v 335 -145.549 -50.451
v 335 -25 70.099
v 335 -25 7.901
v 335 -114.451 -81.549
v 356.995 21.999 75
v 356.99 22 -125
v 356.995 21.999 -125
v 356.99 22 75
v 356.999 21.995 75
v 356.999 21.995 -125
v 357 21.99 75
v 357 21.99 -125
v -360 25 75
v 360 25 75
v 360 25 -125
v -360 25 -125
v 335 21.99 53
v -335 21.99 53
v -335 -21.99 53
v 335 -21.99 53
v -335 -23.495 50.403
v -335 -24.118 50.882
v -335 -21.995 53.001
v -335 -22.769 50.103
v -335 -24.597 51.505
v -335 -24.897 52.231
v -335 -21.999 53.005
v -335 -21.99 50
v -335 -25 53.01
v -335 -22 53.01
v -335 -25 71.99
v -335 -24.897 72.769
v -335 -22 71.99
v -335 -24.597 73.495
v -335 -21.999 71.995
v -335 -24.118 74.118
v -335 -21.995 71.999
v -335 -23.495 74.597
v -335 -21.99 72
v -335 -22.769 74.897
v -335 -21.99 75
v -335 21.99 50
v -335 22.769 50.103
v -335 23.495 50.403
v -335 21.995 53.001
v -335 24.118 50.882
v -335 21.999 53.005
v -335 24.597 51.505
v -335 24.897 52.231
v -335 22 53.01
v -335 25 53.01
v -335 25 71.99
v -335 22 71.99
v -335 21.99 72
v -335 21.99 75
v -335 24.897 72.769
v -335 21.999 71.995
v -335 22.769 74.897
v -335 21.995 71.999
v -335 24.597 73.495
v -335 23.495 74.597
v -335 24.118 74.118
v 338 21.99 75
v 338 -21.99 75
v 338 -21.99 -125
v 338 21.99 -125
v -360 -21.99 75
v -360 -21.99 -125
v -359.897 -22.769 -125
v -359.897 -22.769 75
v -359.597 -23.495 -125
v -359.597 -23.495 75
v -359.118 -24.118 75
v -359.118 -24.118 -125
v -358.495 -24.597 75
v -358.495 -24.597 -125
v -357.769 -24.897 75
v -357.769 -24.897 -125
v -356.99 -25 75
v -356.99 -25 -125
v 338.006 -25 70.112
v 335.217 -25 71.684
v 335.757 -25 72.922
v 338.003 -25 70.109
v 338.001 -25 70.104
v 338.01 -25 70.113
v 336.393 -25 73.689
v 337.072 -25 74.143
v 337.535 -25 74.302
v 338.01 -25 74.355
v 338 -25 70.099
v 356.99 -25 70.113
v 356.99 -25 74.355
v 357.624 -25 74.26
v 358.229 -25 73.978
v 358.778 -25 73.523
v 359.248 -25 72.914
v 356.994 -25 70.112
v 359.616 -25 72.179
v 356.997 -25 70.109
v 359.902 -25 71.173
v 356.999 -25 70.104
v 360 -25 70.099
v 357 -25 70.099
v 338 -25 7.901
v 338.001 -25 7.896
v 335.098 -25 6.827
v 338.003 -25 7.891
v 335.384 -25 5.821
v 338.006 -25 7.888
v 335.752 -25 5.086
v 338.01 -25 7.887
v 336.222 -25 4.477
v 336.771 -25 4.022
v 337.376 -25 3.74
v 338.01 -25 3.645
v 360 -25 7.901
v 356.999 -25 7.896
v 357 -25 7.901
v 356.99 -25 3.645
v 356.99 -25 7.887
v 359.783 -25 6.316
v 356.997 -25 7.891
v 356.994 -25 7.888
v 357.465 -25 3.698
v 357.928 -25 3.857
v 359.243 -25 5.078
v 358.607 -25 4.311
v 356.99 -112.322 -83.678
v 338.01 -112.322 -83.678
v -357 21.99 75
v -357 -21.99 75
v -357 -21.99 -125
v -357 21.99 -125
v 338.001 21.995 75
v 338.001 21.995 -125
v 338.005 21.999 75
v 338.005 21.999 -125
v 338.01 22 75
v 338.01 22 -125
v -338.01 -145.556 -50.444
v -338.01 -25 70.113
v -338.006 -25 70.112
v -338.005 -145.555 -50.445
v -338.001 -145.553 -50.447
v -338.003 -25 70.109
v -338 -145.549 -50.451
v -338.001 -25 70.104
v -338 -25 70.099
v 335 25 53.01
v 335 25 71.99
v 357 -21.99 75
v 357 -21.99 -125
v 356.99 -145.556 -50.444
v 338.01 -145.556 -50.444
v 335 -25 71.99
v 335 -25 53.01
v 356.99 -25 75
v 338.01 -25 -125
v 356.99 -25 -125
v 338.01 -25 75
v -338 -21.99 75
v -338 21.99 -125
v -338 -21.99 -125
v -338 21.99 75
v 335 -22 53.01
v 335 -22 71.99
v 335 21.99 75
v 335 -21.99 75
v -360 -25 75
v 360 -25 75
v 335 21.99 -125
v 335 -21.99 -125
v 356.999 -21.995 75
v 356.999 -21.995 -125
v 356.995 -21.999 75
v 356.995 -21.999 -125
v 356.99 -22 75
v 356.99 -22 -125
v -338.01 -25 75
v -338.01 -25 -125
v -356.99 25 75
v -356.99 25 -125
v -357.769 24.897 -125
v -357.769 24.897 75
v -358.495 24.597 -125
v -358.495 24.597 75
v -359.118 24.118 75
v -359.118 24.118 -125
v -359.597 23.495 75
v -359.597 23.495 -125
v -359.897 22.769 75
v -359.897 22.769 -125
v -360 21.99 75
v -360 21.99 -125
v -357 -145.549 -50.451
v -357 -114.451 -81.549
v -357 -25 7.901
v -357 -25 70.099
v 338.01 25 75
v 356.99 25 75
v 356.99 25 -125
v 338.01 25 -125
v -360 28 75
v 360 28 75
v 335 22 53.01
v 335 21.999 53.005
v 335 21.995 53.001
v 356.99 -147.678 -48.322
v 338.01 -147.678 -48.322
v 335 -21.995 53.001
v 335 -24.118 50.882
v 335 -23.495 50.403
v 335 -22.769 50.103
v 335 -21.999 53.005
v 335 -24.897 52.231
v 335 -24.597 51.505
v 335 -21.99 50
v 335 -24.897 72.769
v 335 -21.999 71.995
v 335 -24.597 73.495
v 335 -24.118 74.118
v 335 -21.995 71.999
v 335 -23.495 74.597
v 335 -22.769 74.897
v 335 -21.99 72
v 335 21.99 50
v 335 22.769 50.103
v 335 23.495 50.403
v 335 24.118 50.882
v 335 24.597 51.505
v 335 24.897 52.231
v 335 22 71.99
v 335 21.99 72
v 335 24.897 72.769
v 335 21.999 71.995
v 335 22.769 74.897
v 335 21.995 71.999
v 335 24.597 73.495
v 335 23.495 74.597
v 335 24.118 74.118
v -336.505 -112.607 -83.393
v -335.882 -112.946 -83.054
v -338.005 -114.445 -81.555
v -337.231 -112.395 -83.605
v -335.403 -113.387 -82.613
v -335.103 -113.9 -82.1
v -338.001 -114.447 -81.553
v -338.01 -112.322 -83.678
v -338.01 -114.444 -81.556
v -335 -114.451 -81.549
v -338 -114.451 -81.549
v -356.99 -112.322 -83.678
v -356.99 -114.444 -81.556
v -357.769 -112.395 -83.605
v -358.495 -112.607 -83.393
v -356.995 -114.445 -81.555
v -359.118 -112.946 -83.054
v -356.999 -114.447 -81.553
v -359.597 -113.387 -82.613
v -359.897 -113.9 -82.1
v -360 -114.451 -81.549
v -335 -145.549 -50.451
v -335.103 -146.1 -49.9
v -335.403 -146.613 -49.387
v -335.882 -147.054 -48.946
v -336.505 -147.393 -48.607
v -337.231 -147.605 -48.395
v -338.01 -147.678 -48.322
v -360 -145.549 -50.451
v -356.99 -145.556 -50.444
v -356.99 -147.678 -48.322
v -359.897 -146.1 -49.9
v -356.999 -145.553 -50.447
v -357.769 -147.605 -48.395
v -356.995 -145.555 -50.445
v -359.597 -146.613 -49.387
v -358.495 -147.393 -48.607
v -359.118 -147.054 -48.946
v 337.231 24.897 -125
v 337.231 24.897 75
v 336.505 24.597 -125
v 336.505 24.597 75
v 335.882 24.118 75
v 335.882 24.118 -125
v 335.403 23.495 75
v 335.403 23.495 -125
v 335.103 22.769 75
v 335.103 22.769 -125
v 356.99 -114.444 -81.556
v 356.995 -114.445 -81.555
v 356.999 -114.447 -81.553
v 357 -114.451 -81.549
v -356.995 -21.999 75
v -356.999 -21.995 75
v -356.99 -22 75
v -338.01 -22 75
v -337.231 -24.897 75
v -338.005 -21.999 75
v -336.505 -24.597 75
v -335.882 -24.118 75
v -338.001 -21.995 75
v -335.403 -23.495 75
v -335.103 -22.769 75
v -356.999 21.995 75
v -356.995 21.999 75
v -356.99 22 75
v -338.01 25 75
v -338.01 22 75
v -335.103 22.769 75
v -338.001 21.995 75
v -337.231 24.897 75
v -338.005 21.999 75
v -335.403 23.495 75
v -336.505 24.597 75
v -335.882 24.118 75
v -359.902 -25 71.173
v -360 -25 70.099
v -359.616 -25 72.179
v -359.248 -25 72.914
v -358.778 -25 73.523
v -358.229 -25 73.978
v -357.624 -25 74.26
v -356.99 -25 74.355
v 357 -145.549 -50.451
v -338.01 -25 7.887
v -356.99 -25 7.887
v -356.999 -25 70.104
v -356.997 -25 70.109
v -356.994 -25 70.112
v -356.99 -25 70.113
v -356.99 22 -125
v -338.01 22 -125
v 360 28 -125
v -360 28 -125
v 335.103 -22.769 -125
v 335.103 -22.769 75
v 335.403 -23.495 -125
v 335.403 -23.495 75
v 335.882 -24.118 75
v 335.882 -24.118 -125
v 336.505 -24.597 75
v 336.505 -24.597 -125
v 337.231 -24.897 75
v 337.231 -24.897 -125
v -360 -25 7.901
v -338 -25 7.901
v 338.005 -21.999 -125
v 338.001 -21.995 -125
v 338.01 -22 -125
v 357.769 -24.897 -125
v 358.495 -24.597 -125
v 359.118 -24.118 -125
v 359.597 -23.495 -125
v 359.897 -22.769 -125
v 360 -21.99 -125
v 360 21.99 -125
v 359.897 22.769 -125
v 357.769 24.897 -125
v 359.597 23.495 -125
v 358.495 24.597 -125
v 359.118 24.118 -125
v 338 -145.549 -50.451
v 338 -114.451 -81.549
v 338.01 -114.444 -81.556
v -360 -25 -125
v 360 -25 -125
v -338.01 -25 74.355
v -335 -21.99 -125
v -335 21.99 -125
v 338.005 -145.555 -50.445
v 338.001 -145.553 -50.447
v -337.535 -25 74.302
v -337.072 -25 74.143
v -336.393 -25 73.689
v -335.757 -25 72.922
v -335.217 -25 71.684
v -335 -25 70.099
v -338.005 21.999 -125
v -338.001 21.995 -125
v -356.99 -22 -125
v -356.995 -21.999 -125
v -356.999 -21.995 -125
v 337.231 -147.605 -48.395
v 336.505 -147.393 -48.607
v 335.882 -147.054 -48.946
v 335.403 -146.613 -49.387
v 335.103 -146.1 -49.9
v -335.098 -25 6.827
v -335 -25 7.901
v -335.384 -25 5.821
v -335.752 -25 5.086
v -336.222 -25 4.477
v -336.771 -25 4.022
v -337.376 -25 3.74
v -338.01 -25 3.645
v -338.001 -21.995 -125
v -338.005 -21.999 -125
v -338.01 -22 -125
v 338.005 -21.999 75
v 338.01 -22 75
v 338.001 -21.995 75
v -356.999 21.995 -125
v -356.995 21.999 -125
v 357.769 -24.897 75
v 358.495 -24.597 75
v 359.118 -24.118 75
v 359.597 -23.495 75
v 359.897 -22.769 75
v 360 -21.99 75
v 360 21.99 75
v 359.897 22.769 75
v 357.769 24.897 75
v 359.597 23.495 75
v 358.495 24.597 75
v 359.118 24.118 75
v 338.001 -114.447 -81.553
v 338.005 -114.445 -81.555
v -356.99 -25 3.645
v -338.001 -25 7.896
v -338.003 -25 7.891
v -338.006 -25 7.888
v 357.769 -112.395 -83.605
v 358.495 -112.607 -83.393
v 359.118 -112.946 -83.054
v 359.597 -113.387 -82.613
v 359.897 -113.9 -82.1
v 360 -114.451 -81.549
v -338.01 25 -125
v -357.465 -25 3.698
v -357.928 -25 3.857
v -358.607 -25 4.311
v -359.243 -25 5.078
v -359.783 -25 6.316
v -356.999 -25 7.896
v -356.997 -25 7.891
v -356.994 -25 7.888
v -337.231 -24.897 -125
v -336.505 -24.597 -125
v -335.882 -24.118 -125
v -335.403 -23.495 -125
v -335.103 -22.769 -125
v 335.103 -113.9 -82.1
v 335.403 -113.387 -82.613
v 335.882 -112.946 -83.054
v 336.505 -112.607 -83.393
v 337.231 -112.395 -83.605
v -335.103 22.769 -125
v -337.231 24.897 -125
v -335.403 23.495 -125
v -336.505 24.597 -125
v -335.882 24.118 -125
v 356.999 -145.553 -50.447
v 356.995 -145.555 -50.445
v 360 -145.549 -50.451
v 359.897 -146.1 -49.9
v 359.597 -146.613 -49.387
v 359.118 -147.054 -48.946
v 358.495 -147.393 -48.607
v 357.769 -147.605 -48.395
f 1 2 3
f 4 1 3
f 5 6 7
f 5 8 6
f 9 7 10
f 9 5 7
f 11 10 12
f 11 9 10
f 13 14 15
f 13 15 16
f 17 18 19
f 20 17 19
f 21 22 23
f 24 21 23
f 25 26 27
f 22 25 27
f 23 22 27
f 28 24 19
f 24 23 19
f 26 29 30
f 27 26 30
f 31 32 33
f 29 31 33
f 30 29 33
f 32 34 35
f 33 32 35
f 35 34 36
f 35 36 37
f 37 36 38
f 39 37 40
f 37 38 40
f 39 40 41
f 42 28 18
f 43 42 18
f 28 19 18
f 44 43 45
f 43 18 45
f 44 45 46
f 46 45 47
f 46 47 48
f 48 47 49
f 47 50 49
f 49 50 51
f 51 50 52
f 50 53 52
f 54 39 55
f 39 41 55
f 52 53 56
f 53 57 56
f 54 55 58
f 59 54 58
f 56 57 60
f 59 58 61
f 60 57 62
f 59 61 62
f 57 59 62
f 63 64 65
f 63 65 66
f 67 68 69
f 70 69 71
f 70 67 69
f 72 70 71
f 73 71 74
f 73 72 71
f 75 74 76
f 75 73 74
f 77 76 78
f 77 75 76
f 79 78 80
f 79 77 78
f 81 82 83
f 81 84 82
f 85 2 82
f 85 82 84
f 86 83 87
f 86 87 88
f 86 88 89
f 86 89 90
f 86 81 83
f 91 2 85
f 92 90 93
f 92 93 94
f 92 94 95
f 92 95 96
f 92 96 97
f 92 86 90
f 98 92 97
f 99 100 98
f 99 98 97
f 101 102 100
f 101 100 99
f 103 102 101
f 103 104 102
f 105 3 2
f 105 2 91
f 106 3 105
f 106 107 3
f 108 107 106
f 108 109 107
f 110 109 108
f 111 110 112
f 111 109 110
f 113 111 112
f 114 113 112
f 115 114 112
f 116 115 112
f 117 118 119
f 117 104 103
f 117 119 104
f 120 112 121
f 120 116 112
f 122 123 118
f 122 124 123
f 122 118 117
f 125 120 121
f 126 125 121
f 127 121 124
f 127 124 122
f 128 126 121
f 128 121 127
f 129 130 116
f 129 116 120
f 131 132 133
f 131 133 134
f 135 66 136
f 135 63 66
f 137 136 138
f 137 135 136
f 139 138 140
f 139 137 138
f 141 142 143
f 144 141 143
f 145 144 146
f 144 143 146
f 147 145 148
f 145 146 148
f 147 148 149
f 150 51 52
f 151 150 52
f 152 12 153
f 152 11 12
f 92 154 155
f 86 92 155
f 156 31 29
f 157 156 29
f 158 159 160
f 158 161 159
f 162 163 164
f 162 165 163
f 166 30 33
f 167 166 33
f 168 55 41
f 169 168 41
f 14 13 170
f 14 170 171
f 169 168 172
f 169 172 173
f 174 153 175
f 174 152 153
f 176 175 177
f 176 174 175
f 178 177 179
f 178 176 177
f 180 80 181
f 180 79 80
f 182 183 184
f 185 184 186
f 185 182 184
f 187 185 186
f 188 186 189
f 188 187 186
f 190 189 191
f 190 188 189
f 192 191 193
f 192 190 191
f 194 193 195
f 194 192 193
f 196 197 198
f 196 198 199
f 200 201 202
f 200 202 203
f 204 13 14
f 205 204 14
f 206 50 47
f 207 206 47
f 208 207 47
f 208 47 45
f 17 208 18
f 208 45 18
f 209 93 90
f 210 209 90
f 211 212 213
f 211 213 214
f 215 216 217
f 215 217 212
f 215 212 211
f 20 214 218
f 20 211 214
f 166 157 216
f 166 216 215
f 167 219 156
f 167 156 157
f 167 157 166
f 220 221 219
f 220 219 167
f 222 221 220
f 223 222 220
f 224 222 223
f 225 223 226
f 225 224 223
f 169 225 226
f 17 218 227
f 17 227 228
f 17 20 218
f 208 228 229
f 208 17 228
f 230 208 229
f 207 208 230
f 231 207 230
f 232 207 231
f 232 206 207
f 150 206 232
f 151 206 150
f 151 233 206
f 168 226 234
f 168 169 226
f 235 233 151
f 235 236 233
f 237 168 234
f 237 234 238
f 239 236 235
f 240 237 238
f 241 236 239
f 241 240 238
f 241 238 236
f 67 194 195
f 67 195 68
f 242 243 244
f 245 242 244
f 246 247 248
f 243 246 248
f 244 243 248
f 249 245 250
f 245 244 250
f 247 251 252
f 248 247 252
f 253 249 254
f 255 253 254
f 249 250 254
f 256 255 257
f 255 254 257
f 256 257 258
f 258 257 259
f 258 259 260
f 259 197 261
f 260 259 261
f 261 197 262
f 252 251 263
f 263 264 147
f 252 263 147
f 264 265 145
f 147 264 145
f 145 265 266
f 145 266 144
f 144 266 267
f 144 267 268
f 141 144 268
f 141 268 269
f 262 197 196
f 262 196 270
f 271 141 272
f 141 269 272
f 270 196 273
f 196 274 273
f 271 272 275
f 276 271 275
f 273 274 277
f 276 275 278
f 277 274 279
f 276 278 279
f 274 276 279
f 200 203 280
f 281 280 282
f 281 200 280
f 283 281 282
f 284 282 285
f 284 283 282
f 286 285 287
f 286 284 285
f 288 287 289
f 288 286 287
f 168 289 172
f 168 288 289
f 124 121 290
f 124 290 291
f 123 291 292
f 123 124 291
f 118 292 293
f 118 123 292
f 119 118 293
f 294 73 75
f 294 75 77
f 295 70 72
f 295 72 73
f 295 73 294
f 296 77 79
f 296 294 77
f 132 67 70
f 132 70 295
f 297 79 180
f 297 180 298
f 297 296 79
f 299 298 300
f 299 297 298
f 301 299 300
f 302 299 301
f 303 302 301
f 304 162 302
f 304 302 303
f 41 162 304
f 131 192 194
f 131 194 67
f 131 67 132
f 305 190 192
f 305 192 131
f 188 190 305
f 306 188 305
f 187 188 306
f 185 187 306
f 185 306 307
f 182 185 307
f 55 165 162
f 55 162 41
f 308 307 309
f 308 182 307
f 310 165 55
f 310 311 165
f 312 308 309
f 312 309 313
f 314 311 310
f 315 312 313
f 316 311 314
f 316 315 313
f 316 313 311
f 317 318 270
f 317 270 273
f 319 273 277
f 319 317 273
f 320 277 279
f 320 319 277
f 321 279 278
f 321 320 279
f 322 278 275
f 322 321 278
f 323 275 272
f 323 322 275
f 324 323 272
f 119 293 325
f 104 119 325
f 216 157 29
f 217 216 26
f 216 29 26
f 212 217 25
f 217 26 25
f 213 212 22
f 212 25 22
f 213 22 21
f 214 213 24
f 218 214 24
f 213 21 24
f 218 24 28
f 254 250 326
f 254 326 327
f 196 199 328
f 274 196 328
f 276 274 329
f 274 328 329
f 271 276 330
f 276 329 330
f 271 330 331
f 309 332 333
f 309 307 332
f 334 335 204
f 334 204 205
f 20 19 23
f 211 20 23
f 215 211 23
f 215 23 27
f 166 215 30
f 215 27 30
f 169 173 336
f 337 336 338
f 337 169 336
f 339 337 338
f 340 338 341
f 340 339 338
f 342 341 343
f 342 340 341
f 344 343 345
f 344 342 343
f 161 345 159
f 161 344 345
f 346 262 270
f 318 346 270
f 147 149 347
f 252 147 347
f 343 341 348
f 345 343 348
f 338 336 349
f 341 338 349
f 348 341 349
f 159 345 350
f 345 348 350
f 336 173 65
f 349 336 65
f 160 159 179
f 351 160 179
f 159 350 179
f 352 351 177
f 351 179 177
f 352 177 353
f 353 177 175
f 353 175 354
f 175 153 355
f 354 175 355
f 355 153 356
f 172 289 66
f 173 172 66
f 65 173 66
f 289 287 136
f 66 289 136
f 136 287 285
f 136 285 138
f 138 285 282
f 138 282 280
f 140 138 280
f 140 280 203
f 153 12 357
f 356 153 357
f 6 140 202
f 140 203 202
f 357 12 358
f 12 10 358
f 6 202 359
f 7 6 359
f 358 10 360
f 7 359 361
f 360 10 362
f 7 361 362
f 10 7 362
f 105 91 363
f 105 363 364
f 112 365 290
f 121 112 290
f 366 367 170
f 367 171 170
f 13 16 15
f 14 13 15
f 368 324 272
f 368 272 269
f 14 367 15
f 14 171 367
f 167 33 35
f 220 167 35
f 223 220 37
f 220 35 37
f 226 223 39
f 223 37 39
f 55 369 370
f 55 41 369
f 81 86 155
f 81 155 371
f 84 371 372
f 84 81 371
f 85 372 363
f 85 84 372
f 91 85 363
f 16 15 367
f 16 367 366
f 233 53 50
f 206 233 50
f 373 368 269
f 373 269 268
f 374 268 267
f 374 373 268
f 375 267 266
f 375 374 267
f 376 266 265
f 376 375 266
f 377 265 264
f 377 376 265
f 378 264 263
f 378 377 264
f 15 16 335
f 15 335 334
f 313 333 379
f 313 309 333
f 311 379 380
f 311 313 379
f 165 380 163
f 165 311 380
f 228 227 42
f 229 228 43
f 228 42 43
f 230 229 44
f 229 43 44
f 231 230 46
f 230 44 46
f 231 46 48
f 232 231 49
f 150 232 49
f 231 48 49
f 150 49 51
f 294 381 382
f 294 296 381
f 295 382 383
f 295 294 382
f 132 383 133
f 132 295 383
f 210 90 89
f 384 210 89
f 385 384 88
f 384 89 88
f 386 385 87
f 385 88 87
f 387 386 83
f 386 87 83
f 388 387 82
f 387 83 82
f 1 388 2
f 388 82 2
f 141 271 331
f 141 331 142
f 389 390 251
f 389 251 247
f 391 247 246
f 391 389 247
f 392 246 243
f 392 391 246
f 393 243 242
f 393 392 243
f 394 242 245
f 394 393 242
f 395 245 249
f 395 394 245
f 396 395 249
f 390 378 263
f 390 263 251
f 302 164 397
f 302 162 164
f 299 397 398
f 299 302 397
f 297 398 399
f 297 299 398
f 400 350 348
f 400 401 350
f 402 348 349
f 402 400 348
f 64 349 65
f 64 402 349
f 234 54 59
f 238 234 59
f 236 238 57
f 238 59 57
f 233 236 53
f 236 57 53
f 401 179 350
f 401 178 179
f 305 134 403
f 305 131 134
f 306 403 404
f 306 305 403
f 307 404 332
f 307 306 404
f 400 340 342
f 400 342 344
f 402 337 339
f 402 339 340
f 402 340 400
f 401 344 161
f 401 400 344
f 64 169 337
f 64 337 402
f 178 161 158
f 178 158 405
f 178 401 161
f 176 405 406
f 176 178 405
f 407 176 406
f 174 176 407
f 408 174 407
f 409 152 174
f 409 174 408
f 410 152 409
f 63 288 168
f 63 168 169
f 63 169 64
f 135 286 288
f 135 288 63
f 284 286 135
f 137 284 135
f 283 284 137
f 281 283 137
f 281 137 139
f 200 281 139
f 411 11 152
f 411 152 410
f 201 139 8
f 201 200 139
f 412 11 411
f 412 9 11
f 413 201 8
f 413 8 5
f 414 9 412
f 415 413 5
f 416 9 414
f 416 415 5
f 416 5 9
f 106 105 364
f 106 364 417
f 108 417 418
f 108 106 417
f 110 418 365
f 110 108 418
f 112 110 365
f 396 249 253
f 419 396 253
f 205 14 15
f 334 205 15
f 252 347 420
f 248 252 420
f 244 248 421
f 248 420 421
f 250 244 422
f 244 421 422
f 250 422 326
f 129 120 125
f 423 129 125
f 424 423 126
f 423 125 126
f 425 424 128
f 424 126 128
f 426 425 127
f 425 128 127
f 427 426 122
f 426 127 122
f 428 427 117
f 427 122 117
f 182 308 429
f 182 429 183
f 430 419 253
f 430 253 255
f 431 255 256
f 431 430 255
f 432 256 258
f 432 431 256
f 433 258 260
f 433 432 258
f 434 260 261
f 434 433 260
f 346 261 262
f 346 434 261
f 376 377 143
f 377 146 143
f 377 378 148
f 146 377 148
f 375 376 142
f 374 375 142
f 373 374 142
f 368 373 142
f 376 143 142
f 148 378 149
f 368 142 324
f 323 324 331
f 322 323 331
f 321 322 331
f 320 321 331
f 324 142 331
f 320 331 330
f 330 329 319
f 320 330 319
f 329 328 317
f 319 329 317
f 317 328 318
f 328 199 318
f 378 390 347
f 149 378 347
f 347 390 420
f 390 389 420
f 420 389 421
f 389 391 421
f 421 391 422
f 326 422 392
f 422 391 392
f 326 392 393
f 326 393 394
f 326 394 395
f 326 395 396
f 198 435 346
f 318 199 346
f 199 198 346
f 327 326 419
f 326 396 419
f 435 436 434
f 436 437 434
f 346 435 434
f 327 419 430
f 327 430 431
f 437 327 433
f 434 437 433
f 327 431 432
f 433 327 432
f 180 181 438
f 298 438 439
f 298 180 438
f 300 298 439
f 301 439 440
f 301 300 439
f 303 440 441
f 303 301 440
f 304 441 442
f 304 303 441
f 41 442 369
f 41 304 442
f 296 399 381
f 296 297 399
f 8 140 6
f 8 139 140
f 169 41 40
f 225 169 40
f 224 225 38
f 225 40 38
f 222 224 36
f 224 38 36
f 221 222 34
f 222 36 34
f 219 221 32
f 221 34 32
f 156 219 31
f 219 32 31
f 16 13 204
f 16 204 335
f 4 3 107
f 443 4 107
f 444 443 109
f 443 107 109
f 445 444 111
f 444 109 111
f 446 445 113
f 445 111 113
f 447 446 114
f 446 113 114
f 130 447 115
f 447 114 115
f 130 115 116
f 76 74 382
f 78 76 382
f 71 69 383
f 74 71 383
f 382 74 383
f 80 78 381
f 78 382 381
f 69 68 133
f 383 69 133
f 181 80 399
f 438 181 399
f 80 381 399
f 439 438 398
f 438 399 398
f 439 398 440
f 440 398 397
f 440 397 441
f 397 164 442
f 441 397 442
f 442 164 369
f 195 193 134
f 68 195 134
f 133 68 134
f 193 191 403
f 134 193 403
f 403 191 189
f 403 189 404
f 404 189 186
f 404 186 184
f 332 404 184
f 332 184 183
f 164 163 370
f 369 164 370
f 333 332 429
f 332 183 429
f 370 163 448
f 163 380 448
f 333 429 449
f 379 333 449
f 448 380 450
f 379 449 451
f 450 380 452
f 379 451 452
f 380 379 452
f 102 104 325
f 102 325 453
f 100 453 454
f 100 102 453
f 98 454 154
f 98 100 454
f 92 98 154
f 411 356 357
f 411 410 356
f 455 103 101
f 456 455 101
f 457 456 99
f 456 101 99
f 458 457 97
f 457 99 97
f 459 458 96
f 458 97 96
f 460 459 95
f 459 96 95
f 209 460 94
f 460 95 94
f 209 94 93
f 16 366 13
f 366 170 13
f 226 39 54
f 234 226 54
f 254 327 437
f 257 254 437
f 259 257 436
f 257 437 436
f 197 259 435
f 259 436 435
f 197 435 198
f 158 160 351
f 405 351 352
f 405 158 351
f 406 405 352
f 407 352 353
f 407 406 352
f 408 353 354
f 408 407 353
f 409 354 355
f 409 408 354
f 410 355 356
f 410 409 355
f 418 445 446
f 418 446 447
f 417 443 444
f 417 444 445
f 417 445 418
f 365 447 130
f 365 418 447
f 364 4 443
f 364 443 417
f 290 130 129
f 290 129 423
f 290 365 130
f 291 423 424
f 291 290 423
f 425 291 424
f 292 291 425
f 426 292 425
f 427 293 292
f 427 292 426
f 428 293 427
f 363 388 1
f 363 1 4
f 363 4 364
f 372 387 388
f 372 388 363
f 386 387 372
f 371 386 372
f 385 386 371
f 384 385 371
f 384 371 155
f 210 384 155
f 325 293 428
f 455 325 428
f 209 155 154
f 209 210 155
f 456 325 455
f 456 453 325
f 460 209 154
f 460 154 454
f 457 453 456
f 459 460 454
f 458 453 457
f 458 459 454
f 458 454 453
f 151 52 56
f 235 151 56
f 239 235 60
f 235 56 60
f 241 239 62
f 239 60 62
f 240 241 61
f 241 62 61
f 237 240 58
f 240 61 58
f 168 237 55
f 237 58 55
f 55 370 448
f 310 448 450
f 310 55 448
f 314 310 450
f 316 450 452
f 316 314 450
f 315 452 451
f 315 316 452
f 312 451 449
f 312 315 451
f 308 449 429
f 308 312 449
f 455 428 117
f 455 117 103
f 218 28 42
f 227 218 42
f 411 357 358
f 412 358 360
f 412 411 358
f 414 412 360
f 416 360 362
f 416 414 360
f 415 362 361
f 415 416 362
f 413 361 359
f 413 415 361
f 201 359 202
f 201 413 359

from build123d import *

# Parameters (mm, degrees)
SKETCH_1_W              = 720
SKETCH_1_H              = 150
EXTRUDE_1_DEPTH         = 25
SKETCH_2_W              = 720
SKETCH_2_H              = 50
EXTRUDE_2_DEPTH         = 50
F_50_START              = -335
F_50_X_25_X_3_1_DEPTH   = 670
F_50_START_2            = -75
F_50_X_25_X_3_1_2_DEPTH = 150
F_50_X_25_X_3_1_3_DEPTH = 150
BODY_START              = -75
BODY_4_RUN_ON_DEPTH     = 50
BODY_3_RUN_ON_DEPTH     = 50
SKETCH_5_W              = 720
SKETCH_5_H              = 200
EXTRUDE_3_DEPTH         = 3
F_50_X_25_X_3_2_DEPTH   = 183.847763109


# Read off the part's stored shape, not the designer's step: Прямоугольная труба 50 X 25 X 3(1), Отсечь/Удлинить2
with BuildPart() as part:
    # Эскиз1 → Бобышка-Вытянуть1 (new, symmetric)
    with BuildSketch(Plane(origin=(0, 0, 0), x_dir=(1, 0, 0), z_dir=(0, 1, 0))):
        Rectangle(SKETCH_1_W, SKETCH_1_H)
    extrude(amount=EXTRUDE_1_DEPTH, both=True)

    # Эскиз2 → Бобышка-Вытянуть2 (add)
    with BuildSketch(Plane(origin=(0, 0, -75), x_dir=(-1, 0, 0), z_dir=(0, 0, -1))):
        Rectangle(SKETCH_2_W, SKETCH_2_H)
    extrude(amount=EXTRUDE_2_DEPTH)


with BuildPart() as body_2:
    # Прямоугольная труба 50 X 25 X 3(1) outline → Прямоугольная труба 50 X 25 X 3(1) (new body)
    with BuildSketch(Plane.YZ.offset(F_50_START)):
        with BuildLine():
            Line((-21.99, 50), (21.99, 50))
            ThreePointArc((21.99, 50), (24.118391411, 50.881608589), (25, 53.01))
            Line((25, 53.01), (25, 71.99))
            ThreePointArc((25, 71.99), (24.118391411, 74.118391411), (21.99, 75))
            Line((21.99, 75), (-21.99, 75))
            ThreePointArc((-21.99, 75), (-24.118391411, 74.118391411), (-25, 71.99))
            Line((-25, 71.99), (-25, 53.01))
            ThreePointArc((-25, 53.01), (-24.118391411, 50.881608589), (-21.99, 50))
        make_face()
        with BuildLine():
            ThreePointArc((-22, 71.99), (-21.997071068, 71.997071068), (-21.99, 72))
            Line((-21.99, 72), (21.99, 72))
            ThreePointArc((21.99, 72), (21.997071068, 71.997071068), (22, 71.99))
            Line((22, 71.99), (22, 53.01))
            ThreePointArc((22, 53.01), (21.997071068, 53.002928932), (21.99, 53))
            Line((21.99, 53), (-21.99, 53))
            ThreePointArc((-21.99, 53), (-21.997071068, 53.002928932), (-22, 53.01))
            Line((-22, 53.01), (-22, 71.99))
        make_face(mode=Mode.SUBTRACT)
    extrude(amount=F_50_X_25_X_3_1_DEPTH)


with BuildPart() as body_3:
    # 50 X 25 X 3_1 2 outline → 50 X 25 X 3_1 2 (new body)
    with BuildSketch(Plane.XY.offset(F_50_START_2)):
        with BuildLine():
            ThreePointArc((360, 21.99), (359.118391411, 24.118391411), (356.99, 25))
            Line((356.99, 25), (338.01, 25))
            ThreePointArc((338.01, 25), (335.881608589, 24.118391411), (335, 21.99))
            Line((335, 21.99), (335, -21.99))
            ThreePointArc((335, -21.99), (335.881608589, -24.118391411), (338.01, -25))
            Line((338.01, -25), (356.99, -25))
            ThreePointArc((356.99, -25), (359.118391411, -24.118391411), (360, -21.99))
            Line((360, -21.99), (360, 21.99))
        make_face()
        with BuildLine():
            Line((338, -21.99), (338, 21.99))
            ThreePointArc((338, 21.99), (338.002928932, 21.997071068), (338.01, 22))
            Line((338.01, 22), (356.99, 22))
            ThreePointArc((356.99, 22), (356.997071068, 21.997071068), (357, 21.99))
            Line((357, 21.99), (357, -21.99))
            ThreePointArc((357, -21.99), (356.997071068, -21.997071068), (356.99, -22))
            Line((356.99, -22), (338.01, -22))
            ThreePointArc((338.01, -22), (338.002928932, -21.997071068), (338, -21.99))
        make_face(mode=Mode.SUBTRACT)
    extrude(amount=F_50_X_25_X_3_1_2_DEPTH)

    # 50 X 25 X 3_1 2 outline → body 3 run on (add)
    with BuildSketch(Plane.XY.offset(BODY_START)):
        with BuildLine():
            ThreePointArc((360, 21.99), (359.118391411, 24.118391411), (356.99, 25))
            Line((356.99, 25), (338.01, 25))
            ThreePointArc((338.01, 25), (335.881608589, 24.118391411), (335, 21.99))
            Line((335, 21.99), (335, -21.99))
            ThreePointArc((335, -21.99), (335.881608589, -24.118391411), (338.01, -25))
            Line((338.01, -25), (356.99, -25))
            ThreePointArc((356.99, -25), (359.118391411, -24.118391411), (360, -21.99))
            Line((360, -21.99), (360, 21.99))
        make_face()
        with BuildLine():
            Line((338, -21.99), (338, 21.99))
            ThreePointArc((338, 21.99), (338.002928932, 21.997071068), (338.01, 22))
            Line((338.01, 22), (356.99, 22))
            ThreePointArc((356.99, 22), (356.997071068, 21.997071068), (357, 21.99))
            Line((357, 21.99), (357, -21.99))
            ThreePointArc((357, -21.99), (356.997071068, -21.997071068), (356.99, -22))
            Line((356.99, -22), (338.01, -22))
            ThreePointArc((338.01, -22), (338.002928932, -21.997071068), (338, -21.99))
        make_face(mode=Mode.SUBTRACT)
    extrude(amount=-BODY_3_RUN_ON_DEPTH)


with BuildPart() as body_4:
    # 50 X 25 X 3_1 3 outline → 50 X 25 X 3_1 3 (new body)
    with BuildSketch(Plane.XY.offset(F_50_START_2)):
        with BuildLine():
            ThreePointArc((-335, 21.99), (-335.881608589, 24.118391411), (-338.01, 25))
            Line((-338.01, 25), (-356.99, 25))
            ThreePointArc((-356.99, 25), (-359.118391411, 24.118391411), (-360, 21.99))
            Line((-360, 21.99), (-360, -21.99))
            ThreePointArc((-360, -21.99), (-359.118391411, -24.118391411), (-356.99, -25))
            Line((-356.99, -25), (-338.01, -25))
            ThreePointArc((-338.01, -25), (-335.881608589, -24.118391411), (-335, -21.99))
            Line((-335, -21.99), (-335, 21.99))
        make_face()
        with BuildLine():
            Line((-357, -21.99), (-357, 21.99))
            ThreePointArc((-357, 21.99), (-356.997071068, 21.997071068), (-356.99, 22))
            Line((-356.99, 22), (-338.01, 22))
            ThreePointArc((-338.01, 22), (-338.002928932, 21.997071068), (-338, 21.99))
            Line((-338, 21.99), (-338, -21.99))
            ThreePointArc((-338, -21.99), (-338.002928932, -21.997071068), (-338.01, -22))
            Line((-338.01, -22), (-356.99, -22))
            ThreePointArc((-356.99, -22), (-356.997071068, -21.997071068), (-357, -21.99))
        make_face(mode=Mode.SUBTRACT)
    extrude(amount=F_50_X_25_X_3_1_3_DEPTH)

    # 50 X 25 X 3_1 3 outline → body 4 run on (add)
    with BuildSketch(Plane.XY.offset(BODY_START)):
        with BuildLine():
            ThreePointArc((-335, 21.99), (-335.881608589, 24.118391411), (-338.01, 25))
            Line((-338.01, 25), (-356.99, 25))
            ThreePointArc((-356.99, 25), (-359.118391411, 24.118391411), (-360, 21.99))
            Line((-360, 21.99), (-360, -21.99))
            ThreePointArc((-360, -21.99), (-359.118391411, -24.118391411), (-356.99, -25))
            Line((-356.99, -25), (-338.01, -25))
            ThreePointArc((-338.01, -25), (-335.881608589, -24.118391411), (-335, -21.99))
            Line((-335, -21.99), (-335, 21.99))
        make_face()
        with BuildLine():
            Line((-357, -21.99), (-357, 21.99))
            ThreePointArc((-357, 21.99), (-356.997071068, 21.997071068), (-356.99, 22))
            Line((-356.99, 22), (-338.01, 22))
            ThreePointArc((-338.01, 22), (-338.002928932, 21.997071068), (-338, 21.99))
            Line((-338, 21.99), (-338, -21.99))
            ThreePointArc((-338, -21.99), (-338.002928932, -21.997071068), (-338.01, -22))
            Line((-338.01, -22), (-356.99, -22))
            ThreePointArc((-356.99, -22), (-356.997071068, -21.997071068), (-357, -21.99))
        make_face(mode=Mode.SUBTRACT)
    extrude(amount=-BODY_4_RUN_ON_DEPTH)


with BuildPart() as body_5:
    # Эскиз5 → Бобышка-Вытянуть3 (new body)
    with BuildSketch(Plane(origin=(0, 25, 0), x_dir=(1, 0, 0), z_dir=(0, 1, 0))):
        with Locations((0, 25)):
            Rectangle(SKETCH_5_W, SKETCH_5_H)
    extrude(amount=EXTRUDE_3_DEPTH)


with BuildPart() as body_6:
    # Sketch11 → Прямоугольная труба 50 X 25 X 3(2) (new body)
    with BuildSketch(Plane(origin=(347.5, 0, 64), x_dir=(1, 0, 0), z_dir=(0, -0.7071067811865487, -0.7071067811865465))):
        with BuildLine():
            Line((-9.49, -25), (9.49, -25))
            ThreePointArc((9.49, -25), (11.618391411, -24.118391411), (12.5, -21.99))
            Line((12.5, -21.99), (12.5, 21.99))
            ThreePointArc((12.5, 21.99), (11.618391411, 24.118391411), (9.49, 25))
            Line((9.49, 25), (-9.49, 25))
            ThreePointArc((-9.49, 25), (-11.618391411, 24.118391411), (-12.5, 21.99))
            Line((-12.5, 21.99), (-12.5, -21.99))
            ThreePointArc((-12.5, -21.99), (-11.618391411, -24.118391411), (-9.49, -25))
        make_face()
        with BuildLine():
            Line((-9.49, -22), (9.49, -22))
            ThreePointArc((9.49, -22), (9.497071068, -21.997071068), (9.5, -21.99))
            Line((9.5, -21.99), (9.5, 21.99))
            ThreePointArc((9.5, 21.99), (9.497071068, 21.997071068), (9.49, 22))
            Line((9.49, 22), (-9.49, 22))
            ThreePointArc((-9.49, 22), (-9.497071068, 21.997071068), (-9.5, 21.99))
            Line((-9.5, 21.99), (-9.5, -21.99))
            ThreePointArc((-9.5, -21.99), (-9.497071068, -21.997071068), (-9.49, -22))
        make_face(mode=Mode.SUBTRACT)
    extrude(amount=F_50_X_25_X_3_2_DEPTH)


with BuildPart() as body_7:
    # Weld Trim 2: the piece on the far side of the plane
    add(body_6.part)
    split(bisect_by=Plane(origin=(0, -25, 0), x_dir=(1, 0, 0), z_dir=(0, 1, 0)), keep=Keep.BOTTOM)


with BuildPart() as body_6_1:
    add(body_6.part)

    # Weld Trim 2
    split(bisect_by=Plane(origin=(0, -25, 0), x_dir=(1, 0, 0), z_dir=(0, 1, 0)), keep=Keep.TOP)


with BuildPart() as body_7_2:
    # Зеркальное отражение1: mirrored copy
    add(body_7.part.mirror(Plane(origin=(0, 0, 0), x_dir=(0, 0, 1), z_dir=(1, 0, 0))))


solid = Compound([part.part, body_2.part, body_3.part, body_4.part, body_5.part, body_7.part, body_7_2.part])
